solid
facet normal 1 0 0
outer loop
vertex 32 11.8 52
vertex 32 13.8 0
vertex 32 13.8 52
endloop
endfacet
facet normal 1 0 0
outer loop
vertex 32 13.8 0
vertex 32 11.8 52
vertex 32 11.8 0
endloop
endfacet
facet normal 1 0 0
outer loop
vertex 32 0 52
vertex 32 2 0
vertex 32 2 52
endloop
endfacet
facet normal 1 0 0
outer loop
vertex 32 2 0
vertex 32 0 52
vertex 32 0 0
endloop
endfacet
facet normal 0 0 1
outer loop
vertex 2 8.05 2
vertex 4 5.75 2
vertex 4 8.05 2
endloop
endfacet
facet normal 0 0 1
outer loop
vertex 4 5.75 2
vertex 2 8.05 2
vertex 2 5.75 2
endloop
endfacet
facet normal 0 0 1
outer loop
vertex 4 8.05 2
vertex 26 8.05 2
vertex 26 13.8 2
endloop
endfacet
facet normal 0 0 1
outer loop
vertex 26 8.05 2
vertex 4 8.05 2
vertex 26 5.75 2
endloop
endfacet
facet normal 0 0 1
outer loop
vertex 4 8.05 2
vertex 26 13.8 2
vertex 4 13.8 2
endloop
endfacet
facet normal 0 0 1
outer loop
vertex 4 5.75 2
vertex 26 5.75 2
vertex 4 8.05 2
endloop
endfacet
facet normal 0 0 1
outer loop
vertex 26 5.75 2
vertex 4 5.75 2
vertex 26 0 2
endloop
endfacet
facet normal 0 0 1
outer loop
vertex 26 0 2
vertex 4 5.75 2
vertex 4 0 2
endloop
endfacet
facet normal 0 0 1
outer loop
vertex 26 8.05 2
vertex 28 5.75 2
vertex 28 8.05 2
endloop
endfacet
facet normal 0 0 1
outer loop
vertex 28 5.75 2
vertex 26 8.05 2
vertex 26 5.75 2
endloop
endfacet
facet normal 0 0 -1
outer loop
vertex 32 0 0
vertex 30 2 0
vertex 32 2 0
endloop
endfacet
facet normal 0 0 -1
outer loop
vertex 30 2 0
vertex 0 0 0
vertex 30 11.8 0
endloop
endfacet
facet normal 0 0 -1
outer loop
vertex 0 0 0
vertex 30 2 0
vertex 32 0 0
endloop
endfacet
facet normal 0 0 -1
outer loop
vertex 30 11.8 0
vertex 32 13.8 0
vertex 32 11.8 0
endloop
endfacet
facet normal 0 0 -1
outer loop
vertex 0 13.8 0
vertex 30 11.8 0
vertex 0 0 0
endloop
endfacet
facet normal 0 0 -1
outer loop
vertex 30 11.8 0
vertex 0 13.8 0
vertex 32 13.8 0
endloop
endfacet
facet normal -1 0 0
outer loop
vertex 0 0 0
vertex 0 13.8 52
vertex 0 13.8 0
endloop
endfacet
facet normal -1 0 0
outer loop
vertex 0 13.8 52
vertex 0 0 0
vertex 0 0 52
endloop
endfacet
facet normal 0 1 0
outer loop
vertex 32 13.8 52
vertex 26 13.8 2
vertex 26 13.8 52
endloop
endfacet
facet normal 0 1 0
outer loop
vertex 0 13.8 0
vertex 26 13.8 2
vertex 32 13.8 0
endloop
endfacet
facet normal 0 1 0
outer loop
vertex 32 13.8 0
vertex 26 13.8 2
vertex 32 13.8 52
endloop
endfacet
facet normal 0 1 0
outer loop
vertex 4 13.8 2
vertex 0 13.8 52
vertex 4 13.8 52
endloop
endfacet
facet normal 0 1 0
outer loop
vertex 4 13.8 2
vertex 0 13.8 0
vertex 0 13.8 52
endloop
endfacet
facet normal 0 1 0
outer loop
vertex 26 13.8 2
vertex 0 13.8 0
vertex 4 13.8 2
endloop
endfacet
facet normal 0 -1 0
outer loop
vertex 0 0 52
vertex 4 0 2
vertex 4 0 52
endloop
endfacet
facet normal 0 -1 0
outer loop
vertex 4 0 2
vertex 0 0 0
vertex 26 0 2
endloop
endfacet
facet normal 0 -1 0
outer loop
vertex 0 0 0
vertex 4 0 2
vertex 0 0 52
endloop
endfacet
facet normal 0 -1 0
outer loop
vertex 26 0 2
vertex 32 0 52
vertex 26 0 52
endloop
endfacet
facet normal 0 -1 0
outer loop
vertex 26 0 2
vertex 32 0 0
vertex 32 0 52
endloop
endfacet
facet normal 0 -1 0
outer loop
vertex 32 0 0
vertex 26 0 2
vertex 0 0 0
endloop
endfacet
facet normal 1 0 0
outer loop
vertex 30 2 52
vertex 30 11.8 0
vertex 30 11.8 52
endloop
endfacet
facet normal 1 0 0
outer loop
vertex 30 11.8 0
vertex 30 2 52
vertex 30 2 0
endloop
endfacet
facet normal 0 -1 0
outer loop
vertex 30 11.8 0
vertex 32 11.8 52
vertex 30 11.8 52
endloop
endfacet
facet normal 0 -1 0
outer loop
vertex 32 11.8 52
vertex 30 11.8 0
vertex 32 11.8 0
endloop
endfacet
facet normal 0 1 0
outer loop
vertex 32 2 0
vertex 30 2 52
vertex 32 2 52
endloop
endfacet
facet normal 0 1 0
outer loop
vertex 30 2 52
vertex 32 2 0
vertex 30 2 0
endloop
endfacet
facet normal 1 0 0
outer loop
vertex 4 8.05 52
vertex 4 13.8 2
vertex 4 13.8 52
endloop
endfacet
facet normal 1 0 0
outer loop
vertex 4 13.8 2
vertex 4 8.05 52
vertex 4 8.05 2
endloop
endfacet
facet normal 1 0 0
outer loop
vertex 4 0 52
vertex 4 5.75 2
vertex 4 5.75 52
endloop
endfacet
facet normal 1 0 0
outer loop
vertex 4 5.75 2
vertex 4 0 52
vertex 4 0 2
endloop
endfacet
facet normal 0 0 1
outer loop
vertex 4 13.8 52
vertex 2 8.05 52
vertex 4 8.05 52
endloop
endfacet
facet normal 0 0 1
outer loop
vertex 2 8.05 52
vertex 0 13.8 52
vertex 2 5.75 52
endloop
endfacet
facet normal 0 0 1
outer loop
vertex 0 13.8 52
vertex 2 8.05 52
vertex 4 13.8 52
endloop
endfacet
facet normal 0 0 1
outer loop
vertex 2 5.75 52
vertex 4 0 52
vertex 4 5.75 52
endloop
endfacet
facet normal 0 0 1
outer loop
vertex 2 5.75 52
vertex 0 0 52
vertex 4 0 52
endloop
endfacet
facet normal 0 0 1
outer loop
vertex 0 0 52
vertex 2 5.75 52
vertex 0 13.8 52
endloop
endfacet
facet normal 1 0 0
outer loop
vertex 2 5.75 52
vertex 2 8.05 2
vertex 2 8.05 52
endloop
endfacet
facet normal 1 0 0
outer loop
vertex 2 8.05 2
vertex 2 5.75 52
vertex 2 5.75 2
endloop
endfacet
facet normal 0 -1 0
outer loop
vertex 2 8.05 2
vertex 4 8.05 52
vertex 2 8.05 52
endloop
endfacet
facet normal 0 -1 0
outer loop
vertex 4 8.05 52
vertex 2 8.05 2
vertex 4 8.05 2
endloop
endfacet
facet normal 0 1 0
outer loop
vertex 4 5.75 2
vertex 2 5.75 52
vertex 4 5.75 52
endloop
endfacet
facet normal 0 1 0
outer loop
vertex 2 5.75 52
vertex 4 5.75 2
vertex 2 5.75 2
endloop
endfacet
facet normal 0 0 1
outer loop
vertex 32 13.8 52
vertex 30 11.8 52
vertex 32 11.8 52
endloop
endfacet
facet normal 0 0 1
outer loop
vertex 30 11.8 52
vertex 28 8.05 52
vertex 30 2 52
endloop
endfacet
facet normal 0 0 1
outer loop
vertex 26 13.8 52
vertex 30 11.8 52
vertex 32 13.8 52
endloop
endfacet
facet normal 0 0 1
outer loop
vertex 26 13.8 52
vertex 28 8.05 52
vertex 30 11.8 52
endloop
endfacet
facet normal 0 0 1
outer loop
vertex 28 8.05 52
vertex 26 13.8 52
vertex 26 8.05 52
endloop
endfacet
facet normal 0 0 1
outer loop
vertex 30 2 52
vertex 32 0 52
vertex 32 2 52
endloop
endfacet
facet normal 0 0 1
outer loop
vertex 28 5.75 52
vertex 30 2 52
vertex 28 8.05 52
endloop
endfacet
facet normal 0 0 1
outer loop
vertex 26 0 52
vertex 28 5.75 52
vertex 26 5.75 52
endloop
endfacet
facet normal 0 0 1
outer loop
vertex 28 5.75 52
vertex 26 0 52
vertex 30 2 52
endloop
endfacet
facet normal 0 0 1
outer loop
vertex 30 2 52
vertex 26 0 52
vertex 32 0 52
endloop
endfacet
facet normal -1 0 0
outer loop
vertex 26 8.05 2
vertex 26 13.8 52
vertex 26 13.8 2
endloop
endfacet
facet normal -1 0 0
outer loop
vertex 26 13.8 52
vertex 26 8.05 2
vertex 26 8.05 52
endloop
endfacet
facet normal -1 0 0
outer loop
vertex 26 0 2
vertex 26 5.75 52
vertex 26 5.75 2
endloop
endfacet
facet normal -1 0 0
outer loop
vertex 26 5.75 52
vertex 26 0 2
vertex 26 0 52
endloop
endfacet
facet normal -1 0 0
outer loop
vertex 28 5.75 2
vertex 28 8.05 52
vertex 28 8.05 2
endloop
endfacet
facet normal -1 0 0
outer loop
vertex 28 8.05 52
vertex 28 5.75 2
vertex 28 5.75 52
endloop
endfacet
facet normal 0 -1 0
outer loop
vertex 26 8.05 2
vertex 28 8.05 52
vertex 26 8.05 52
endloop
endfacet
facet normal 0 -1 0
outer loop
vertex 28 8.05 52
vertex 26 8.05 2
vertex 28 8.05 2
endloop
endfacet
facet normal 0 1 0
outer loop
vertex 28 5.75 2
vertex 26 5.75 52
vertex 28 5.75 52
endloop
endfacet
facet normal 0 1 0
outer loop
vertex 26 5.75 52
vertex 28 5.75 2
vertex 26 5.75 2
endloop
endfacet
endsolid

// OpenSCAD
//design and code by bioprint (http://www.thingiverse.com/bioprint)
//This code generates a holder for items used for data collection (customizable)
// 2014-07-11:	first design
// 2014-11-05: formatted to slides



// Chip Thichness
ChipThichness=1.5; // 1.5mm
// Chip Width
ChipWidth=26; // 24mm
// Chip Height
ChipHeight=50; // 50mm

// Nozzle Diameter
NozzleDiameter = 0.4; // use nozzle size

// Holder Bottom Thickness
HolderBottomThickness = 2; // 2mm
// Holder Side Thickness
HolderSideThickness = 2; // 2mm

// Holder Steel Groove Width
HolderSteelGrooveWidth = 9; // 9mm

// Holder Vertical Wall Thickness
HolderVerticalWallThickness = 2; // use nozzle size

//GrooveDepth
GrooveDepth = 2; // 2mm
//Groove Clearance
GrooveClearance = 0.4; // 0.4mm


MyBottomWidth = (HolderSteelGrooveWidth > ChipThichness) ?  HolderSteelGrooveWidth + 2*GrooveClearance + 2 *  HolderSideThickness  : ChipThichness + 2 * HolderSideThickness;
MyBottomLength = ChipWidth + 2*HolderSideThickness + GrooveDepth;


difference(){
	cube(size = [MyBottomLength,MyBottomWidth,HolderBottomThickness], center = false);

   translate ([HolderSideThickness+ChipWidth+HolderSideThickness,MyBottomWidth/2-(HolderSteelGrooveWidth+2*GrooveClearance)/2,0])
		cube(size = [GrooveDepth,HolderSteelGrooveWidth+2*GrooveClearance,ChipHeight+HolderBottomThickness], center = false);
}

difference(){
	translate ([0,0,HolderBottomThickness])
		cube(size = [GrooveDepth+HolderSideThickness,MyBottomWidth,ChipHeight], center = false);
	translate ([HolderSideThickness,MyBottomWidth/2-(ChipThichness+2*GrooveClearance)/2,HolderBottomThickness])
		cube(size = [GrooveDepth+HolderSideThickness,ChipThichness+2*GrooveClearance,ChipHeight], center = false);

}


difference(){
	translate ([HolderSideThickness+ChipWidth-GrooveDepth,0,HolderBottomThickness])
		cube(size = [2*GrooveDepth+HolderSideThickness,MyBottomWidth,ChipHeight], center = false);
   translate ([HolderSideThickness+ChipWidth-GrooveDepth,MyBottomWidth/2-(ChipThichness+2*GrooveClearance)/2,HolderBottomThickness])
		cube(size = [GrooveDepth,ChipThichness+2*GrooveClearance,ChipHeight], center = false);
   translate ([HolderSideThickness+ChipWidth+HolderSideThickness,MyBottomWidth/2-(HolderSteelGrooveWidth+2*GrooveClearance)/2,0])
		cube(size = [GrooveDepth,HolderSteelGrooveWidth+2*GrooveClearance,ChipHeight+HolderBottomThickness], center = false);

}


//		translate([c*WellCenterSpacing, r*WellCenterSpacing+WellCenterSpacing/2, 0-CubeHeight/2]) 
//			cube(size = [CubeShort,CubeLong,CubeHeight], center = true);
//
//			difference() {
//    				translate([c*WellCenterSpacing, r*WellCenterSpacing, 0])
//    					cylinder (h = WellDepth, r=WellDiameter/2, center = true, $fn=20);
//				translate([c*WellCenterSpacing, r*WellCenterSpacing, WellBottomThickness])
//					cylinder (h = WellDepth-WellBottomThickness, r=WellDiameter/2-WallThickness, center = true, $fn=20);
